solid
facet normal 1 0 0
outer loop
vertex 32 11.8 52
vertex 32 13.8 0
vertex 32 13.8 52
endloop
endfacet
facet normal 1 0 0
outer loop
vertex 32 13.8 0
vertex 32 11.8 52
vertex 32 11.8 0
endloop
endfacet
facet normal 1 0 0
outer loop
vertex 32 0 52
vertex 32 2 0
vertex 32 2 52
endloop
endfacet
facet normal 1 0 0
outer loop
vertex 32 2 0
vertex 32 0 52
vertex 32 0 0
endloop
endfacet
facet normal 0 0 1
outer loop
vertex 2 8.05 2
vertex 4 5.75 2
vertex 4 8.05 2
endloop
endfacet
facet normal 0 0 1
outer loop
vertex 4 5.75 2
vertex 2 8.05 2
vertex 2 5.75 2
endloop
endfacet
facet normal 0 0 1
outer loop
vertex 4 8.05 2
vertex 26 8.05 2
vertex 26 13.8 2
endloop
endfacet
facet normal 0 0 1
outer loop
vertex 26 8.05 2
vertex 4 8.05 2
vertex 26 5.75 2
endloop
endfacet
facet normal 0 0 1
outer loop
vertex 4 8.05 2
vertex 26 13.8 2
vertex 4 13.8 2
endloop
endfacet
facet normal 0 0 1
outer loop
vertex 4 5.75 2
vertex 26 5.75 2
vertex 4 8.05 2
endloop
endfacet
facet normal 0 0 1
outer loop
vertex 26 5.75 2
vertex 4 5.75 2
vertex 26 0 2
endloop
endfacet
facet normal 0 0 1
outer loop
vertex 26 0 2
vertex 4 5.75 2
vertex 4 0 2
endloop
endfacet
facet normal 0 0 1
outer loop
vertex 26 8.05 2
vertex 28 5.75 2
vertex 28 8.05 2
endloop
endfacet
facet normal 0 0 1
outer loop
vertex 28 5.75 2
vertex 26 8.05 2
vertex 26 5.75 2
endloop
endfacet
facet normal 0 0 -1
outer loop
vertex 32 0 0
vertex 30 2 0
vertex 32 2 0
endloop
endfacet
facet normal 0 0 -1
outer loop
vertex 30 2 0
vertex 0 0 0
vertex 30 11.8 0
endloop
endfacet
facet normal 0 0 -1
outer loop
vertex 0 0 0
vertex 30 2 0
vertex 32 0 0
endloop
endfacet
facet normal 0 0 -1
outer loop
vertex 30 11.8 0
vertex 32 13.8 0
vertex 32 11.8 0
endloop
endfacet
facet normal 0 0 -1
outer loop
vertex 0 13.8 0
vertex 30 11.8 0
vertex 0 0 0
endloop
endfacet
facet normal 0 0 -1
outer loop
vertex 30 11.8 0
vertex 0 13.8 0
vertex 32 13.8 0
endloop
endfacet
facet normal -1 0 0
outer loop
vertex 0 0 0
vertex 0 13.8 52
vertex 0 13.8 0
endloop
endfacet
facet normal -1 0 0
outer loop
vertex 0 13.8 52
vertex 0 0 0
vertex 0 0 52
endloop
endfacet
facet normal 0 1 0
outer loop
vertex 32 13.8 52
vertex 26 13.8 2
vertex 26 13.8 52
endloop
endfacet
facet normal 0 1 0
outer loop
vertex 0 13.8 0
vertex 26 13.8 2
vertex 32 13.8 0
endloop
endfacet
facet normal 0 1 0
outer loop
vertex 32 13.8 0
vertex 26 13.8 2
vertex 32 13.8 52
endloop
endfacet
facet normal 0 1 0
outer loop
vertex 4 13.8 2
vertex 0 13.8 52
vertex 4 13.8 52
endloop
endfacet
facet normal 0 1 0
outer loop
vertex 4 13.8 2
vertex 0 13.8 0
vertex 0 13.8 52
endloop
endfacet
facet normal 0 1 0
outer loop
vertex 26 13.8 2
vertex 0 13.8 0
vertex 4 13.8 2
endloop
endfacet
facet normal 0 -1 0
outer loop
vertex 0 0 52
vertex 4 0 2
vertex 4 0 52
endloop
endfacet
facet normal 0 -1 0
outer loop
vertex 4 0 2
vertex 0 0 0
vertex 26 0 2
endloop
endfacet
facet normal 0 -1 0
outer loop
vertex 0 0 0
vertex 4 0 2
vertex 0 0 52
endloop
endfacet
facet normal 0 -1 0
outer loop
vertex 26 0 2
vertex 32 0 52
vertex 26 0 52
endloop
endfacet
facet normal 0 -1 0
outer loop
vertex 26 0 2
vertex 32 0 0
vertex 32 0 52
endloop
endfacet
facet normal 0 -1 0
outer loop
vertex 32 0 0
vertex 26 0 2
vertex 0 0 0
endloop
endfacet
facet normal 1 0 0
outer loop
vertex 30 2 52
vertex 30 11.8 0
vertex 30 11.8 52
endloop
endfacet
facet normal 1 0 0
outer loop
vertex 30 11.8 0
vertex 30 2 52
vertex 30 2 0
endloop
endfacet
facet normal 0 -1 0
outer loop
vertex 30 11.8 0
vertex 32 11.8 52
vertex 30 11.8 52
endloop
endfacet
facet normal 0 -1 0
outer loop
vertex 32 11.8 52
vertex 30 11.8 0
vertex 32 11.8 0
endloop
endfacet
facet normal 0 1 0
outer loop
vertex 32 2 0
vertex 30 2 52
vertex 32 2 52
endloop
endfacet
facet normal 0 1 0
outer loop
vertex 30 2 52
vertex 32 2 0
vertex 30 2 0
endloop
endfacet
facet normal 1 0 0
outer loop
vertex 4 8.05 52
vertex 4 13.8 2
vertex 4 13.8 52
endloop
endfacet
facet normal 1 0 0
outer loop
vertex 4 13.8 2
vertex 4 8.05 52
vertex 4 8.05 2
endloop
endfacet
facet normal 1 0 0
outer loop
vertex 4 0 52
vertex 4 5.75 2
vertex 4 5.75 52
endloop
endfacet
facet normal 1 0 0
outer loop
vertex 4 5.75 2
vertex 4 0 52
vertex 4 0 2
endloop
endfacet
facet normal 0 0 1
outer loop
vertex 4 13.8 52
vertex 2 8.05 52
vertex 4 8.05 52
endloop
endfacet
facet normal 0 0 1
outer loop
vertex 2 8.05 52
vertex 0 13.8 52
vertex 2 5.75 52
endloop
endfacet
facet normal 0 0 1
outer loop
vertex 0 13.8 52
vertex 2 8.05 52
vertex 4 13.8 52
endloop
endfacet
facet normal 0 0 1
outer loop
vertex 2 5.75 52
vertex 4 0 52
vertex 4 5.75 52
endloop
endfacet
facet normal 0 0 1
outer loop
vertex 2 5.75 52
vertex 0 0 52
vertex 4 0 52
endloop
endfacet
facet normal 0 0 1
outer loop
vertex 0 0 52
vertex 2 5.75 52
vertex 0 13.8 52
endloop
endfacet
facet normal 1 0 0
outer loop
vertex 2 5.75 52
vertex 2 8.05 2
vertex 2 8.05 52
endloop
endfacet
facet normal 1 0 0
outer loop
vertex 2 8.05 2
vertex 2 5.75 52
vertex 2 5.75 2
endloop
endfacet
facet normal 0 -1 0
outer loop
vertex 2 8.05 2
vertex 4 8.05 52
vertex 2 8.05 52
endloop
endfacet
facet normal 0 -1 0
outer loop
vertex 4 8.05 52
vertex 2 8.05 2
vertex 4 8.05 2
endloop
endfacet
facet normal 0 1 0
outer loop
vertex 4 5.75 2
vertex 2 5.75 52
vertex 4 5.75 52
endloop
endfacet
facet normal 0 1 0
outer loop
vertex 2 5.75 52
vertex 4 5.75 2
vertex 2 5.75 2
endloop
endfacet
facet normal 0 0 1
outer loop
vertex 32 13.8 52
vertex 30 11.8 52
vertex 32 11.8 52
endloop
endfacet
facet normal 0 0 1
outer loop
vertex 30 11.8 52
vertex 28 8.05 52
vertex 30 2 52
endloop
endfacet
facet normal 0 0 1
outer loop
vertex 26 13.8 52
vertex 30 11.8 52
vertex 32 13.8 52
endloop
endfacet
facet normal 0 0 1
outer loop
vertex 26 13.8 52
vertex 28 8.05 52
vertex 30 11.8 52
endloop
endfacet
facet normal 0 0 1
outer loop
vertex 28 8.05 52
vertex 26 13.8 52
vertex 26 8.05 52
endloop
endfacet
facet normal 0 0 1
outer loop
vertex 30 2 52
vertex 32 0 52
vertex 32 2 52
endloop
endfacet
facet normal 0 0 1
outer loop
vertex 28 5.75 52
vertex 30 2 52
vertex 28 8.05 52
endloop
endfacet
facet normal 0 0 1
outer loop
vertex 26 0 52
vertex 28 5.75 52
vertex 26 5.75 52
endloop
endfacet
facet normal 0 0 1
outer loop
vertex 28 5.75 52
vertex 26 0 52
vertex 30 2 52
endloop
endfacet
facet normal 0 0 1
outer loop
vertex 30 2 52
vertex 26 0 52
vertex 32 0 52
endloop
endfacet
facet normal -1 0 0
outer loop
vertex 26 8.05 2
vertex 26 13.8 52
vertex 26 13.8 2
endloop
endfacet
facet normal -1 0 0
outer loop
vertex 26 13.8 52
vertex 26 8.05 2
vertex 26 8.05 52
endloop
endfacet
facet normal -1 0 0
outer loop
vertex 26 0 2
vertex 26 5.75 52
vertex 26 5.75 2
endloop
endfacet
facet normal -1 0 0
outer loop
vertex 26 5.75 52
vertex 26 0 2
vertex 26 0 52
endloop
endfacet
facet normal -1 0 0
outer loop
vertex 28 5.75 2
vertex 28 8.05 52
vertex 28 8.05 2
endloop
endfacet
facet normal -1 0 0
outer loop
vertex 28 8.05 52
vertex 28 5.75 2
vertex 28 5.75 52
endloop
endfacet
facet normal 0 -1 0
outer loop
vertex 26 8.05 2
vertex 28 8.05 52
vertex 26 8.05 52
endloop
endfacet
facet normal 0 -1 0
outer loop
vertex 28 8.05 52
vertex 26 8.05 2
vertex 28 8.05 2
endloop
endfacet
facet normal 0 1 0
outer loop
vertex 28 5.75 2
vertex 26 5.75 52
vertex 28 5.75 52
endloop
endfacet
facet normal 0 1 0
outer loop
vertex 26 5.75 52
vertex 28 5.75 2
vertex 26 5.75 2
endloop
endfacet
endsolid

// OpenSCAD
//design and code by bioprint (http://www.thingiverse.com/bioprint)
//This code generates a holder for items used for data collection (customizable)
// 2014-07-11:	first design
// 2014-11-05: formatted to slides



// Chip Thichness
ChipThichness=1.5; // 1.5mm
// Chip Width
ChipWidth=26; // 24mm
// Chip Height
ChipHeight=50; // 50mm

// Nozzle Diameter
NozzleDiameter = 0.4; // use nozzle size

// Holder Bottom Thickness
HolderBottomThickness = 2; // 2mm
// Holder Side Thickness
HolderSideThickness = 2; // 2mm

// Holder Steel Groove Width
HolderSteelGrooveWidth = 9; // 9mm

// Holder Vertical Wall Thickness
HolderVerticalWallThickness = 2; // use nozzle size

//GrooveDepth
GrooveDepth = 2; // 2mm
//Groove Clearance
GrooveClearance = 0.4; // 0.4mm


MyBottomWidth = (HolderSteelGrooveWidth > ChipThichness) ?  HolderSteelGrooveWidth + 2*GrooveClearance + 2 *  HolderSideThickness  : ChipThichness + 2 * HolderSideThickness;
MyBottomLength = ChipWidth + 2*HolderSideThickness + GrooveDepth;


difference(){
	cube(size = [MyBottomLength,MyBottomWidth,HolderBottomThickness], center = false);

   translate ([HolderSideThickness+ChipWidth+HolderSideThickness,MyBottomWidth/2-(HolderSteelGrooveWidth+2*GrooveClearance)/2,0])
		cube(size = [GrooveDepth,HolderSteelGrooveWidth+2*GrooveClearance,ChipHeight+HolderBottomThickness], center = false);
}

difference(){
	translate ([0,0,HolderBottomThickness])
		cube(size = [GrooveDepth+HolderSideThickness,MyBottomWidth,ChipHeight], center = false);
	translate ([HolderSideThickness,MyBottomWidth/2-(ChipThichness+2*GrooveClearance)/2,HolderBottomThickness])
		cube(size = [GrooveDepth+HolderSideThickness,ChipThichness+2*GrooveClearance,ChipHeight], center = false);

}


difference(){
	translate ([HolderSideThickness+ChipWidth-GrooveDepth,0,HolderBottomThickness])
		cube(size = [2*GrooveDepth+HolderSideThickness,MyBottomWidth,ChipHeight], center = false);
   translate ([HolderSideThickness+ChipWidth-GrooveDepth,MyBottomWidth/2-(ChipThichness+2*GrooveClearance)/2,HolderBottomThickness])
		cube(size = [GrooveDepth,ChipThichness+2*GrooveClearance,ChipHeight], center = false);
   translate ([HolderSideThickness+ChipWidth+HolderSideThickness,MyBottomWidth/2-(HolderSteelGrooveWidth+2*GrooveClearance)/2,0])
		cube(size = [GrooveDepth,HolderSteelGrooveWidth+2*GrooveClearance,ChipHeight+HolderBottomThickness], center = false);

}


//		translate([c*WellCenterSpacing, r*WellCenterSpacing+WellCenterSpacing/2, 0-CubeHeight/2]) 
//			cube(size = [CubeShort,CubeLong,CubeHeight], center = true);
//
//			difference() {
//    				translate([c*WellCenterSpacing, r*WellCenterSpacing, 0])
//    					cylinder (h = WellDepth, r=WellDiameter/2, center = true, $fn=20);
//				translate([c*WellCenterSpacing, r*WellCenterSpacing, WellBottomThickness])
//					cylinder (h = WellDepth-WellBottomThickness, r=WellDiameter/2-WallThickness, center = true, $fn=20);
